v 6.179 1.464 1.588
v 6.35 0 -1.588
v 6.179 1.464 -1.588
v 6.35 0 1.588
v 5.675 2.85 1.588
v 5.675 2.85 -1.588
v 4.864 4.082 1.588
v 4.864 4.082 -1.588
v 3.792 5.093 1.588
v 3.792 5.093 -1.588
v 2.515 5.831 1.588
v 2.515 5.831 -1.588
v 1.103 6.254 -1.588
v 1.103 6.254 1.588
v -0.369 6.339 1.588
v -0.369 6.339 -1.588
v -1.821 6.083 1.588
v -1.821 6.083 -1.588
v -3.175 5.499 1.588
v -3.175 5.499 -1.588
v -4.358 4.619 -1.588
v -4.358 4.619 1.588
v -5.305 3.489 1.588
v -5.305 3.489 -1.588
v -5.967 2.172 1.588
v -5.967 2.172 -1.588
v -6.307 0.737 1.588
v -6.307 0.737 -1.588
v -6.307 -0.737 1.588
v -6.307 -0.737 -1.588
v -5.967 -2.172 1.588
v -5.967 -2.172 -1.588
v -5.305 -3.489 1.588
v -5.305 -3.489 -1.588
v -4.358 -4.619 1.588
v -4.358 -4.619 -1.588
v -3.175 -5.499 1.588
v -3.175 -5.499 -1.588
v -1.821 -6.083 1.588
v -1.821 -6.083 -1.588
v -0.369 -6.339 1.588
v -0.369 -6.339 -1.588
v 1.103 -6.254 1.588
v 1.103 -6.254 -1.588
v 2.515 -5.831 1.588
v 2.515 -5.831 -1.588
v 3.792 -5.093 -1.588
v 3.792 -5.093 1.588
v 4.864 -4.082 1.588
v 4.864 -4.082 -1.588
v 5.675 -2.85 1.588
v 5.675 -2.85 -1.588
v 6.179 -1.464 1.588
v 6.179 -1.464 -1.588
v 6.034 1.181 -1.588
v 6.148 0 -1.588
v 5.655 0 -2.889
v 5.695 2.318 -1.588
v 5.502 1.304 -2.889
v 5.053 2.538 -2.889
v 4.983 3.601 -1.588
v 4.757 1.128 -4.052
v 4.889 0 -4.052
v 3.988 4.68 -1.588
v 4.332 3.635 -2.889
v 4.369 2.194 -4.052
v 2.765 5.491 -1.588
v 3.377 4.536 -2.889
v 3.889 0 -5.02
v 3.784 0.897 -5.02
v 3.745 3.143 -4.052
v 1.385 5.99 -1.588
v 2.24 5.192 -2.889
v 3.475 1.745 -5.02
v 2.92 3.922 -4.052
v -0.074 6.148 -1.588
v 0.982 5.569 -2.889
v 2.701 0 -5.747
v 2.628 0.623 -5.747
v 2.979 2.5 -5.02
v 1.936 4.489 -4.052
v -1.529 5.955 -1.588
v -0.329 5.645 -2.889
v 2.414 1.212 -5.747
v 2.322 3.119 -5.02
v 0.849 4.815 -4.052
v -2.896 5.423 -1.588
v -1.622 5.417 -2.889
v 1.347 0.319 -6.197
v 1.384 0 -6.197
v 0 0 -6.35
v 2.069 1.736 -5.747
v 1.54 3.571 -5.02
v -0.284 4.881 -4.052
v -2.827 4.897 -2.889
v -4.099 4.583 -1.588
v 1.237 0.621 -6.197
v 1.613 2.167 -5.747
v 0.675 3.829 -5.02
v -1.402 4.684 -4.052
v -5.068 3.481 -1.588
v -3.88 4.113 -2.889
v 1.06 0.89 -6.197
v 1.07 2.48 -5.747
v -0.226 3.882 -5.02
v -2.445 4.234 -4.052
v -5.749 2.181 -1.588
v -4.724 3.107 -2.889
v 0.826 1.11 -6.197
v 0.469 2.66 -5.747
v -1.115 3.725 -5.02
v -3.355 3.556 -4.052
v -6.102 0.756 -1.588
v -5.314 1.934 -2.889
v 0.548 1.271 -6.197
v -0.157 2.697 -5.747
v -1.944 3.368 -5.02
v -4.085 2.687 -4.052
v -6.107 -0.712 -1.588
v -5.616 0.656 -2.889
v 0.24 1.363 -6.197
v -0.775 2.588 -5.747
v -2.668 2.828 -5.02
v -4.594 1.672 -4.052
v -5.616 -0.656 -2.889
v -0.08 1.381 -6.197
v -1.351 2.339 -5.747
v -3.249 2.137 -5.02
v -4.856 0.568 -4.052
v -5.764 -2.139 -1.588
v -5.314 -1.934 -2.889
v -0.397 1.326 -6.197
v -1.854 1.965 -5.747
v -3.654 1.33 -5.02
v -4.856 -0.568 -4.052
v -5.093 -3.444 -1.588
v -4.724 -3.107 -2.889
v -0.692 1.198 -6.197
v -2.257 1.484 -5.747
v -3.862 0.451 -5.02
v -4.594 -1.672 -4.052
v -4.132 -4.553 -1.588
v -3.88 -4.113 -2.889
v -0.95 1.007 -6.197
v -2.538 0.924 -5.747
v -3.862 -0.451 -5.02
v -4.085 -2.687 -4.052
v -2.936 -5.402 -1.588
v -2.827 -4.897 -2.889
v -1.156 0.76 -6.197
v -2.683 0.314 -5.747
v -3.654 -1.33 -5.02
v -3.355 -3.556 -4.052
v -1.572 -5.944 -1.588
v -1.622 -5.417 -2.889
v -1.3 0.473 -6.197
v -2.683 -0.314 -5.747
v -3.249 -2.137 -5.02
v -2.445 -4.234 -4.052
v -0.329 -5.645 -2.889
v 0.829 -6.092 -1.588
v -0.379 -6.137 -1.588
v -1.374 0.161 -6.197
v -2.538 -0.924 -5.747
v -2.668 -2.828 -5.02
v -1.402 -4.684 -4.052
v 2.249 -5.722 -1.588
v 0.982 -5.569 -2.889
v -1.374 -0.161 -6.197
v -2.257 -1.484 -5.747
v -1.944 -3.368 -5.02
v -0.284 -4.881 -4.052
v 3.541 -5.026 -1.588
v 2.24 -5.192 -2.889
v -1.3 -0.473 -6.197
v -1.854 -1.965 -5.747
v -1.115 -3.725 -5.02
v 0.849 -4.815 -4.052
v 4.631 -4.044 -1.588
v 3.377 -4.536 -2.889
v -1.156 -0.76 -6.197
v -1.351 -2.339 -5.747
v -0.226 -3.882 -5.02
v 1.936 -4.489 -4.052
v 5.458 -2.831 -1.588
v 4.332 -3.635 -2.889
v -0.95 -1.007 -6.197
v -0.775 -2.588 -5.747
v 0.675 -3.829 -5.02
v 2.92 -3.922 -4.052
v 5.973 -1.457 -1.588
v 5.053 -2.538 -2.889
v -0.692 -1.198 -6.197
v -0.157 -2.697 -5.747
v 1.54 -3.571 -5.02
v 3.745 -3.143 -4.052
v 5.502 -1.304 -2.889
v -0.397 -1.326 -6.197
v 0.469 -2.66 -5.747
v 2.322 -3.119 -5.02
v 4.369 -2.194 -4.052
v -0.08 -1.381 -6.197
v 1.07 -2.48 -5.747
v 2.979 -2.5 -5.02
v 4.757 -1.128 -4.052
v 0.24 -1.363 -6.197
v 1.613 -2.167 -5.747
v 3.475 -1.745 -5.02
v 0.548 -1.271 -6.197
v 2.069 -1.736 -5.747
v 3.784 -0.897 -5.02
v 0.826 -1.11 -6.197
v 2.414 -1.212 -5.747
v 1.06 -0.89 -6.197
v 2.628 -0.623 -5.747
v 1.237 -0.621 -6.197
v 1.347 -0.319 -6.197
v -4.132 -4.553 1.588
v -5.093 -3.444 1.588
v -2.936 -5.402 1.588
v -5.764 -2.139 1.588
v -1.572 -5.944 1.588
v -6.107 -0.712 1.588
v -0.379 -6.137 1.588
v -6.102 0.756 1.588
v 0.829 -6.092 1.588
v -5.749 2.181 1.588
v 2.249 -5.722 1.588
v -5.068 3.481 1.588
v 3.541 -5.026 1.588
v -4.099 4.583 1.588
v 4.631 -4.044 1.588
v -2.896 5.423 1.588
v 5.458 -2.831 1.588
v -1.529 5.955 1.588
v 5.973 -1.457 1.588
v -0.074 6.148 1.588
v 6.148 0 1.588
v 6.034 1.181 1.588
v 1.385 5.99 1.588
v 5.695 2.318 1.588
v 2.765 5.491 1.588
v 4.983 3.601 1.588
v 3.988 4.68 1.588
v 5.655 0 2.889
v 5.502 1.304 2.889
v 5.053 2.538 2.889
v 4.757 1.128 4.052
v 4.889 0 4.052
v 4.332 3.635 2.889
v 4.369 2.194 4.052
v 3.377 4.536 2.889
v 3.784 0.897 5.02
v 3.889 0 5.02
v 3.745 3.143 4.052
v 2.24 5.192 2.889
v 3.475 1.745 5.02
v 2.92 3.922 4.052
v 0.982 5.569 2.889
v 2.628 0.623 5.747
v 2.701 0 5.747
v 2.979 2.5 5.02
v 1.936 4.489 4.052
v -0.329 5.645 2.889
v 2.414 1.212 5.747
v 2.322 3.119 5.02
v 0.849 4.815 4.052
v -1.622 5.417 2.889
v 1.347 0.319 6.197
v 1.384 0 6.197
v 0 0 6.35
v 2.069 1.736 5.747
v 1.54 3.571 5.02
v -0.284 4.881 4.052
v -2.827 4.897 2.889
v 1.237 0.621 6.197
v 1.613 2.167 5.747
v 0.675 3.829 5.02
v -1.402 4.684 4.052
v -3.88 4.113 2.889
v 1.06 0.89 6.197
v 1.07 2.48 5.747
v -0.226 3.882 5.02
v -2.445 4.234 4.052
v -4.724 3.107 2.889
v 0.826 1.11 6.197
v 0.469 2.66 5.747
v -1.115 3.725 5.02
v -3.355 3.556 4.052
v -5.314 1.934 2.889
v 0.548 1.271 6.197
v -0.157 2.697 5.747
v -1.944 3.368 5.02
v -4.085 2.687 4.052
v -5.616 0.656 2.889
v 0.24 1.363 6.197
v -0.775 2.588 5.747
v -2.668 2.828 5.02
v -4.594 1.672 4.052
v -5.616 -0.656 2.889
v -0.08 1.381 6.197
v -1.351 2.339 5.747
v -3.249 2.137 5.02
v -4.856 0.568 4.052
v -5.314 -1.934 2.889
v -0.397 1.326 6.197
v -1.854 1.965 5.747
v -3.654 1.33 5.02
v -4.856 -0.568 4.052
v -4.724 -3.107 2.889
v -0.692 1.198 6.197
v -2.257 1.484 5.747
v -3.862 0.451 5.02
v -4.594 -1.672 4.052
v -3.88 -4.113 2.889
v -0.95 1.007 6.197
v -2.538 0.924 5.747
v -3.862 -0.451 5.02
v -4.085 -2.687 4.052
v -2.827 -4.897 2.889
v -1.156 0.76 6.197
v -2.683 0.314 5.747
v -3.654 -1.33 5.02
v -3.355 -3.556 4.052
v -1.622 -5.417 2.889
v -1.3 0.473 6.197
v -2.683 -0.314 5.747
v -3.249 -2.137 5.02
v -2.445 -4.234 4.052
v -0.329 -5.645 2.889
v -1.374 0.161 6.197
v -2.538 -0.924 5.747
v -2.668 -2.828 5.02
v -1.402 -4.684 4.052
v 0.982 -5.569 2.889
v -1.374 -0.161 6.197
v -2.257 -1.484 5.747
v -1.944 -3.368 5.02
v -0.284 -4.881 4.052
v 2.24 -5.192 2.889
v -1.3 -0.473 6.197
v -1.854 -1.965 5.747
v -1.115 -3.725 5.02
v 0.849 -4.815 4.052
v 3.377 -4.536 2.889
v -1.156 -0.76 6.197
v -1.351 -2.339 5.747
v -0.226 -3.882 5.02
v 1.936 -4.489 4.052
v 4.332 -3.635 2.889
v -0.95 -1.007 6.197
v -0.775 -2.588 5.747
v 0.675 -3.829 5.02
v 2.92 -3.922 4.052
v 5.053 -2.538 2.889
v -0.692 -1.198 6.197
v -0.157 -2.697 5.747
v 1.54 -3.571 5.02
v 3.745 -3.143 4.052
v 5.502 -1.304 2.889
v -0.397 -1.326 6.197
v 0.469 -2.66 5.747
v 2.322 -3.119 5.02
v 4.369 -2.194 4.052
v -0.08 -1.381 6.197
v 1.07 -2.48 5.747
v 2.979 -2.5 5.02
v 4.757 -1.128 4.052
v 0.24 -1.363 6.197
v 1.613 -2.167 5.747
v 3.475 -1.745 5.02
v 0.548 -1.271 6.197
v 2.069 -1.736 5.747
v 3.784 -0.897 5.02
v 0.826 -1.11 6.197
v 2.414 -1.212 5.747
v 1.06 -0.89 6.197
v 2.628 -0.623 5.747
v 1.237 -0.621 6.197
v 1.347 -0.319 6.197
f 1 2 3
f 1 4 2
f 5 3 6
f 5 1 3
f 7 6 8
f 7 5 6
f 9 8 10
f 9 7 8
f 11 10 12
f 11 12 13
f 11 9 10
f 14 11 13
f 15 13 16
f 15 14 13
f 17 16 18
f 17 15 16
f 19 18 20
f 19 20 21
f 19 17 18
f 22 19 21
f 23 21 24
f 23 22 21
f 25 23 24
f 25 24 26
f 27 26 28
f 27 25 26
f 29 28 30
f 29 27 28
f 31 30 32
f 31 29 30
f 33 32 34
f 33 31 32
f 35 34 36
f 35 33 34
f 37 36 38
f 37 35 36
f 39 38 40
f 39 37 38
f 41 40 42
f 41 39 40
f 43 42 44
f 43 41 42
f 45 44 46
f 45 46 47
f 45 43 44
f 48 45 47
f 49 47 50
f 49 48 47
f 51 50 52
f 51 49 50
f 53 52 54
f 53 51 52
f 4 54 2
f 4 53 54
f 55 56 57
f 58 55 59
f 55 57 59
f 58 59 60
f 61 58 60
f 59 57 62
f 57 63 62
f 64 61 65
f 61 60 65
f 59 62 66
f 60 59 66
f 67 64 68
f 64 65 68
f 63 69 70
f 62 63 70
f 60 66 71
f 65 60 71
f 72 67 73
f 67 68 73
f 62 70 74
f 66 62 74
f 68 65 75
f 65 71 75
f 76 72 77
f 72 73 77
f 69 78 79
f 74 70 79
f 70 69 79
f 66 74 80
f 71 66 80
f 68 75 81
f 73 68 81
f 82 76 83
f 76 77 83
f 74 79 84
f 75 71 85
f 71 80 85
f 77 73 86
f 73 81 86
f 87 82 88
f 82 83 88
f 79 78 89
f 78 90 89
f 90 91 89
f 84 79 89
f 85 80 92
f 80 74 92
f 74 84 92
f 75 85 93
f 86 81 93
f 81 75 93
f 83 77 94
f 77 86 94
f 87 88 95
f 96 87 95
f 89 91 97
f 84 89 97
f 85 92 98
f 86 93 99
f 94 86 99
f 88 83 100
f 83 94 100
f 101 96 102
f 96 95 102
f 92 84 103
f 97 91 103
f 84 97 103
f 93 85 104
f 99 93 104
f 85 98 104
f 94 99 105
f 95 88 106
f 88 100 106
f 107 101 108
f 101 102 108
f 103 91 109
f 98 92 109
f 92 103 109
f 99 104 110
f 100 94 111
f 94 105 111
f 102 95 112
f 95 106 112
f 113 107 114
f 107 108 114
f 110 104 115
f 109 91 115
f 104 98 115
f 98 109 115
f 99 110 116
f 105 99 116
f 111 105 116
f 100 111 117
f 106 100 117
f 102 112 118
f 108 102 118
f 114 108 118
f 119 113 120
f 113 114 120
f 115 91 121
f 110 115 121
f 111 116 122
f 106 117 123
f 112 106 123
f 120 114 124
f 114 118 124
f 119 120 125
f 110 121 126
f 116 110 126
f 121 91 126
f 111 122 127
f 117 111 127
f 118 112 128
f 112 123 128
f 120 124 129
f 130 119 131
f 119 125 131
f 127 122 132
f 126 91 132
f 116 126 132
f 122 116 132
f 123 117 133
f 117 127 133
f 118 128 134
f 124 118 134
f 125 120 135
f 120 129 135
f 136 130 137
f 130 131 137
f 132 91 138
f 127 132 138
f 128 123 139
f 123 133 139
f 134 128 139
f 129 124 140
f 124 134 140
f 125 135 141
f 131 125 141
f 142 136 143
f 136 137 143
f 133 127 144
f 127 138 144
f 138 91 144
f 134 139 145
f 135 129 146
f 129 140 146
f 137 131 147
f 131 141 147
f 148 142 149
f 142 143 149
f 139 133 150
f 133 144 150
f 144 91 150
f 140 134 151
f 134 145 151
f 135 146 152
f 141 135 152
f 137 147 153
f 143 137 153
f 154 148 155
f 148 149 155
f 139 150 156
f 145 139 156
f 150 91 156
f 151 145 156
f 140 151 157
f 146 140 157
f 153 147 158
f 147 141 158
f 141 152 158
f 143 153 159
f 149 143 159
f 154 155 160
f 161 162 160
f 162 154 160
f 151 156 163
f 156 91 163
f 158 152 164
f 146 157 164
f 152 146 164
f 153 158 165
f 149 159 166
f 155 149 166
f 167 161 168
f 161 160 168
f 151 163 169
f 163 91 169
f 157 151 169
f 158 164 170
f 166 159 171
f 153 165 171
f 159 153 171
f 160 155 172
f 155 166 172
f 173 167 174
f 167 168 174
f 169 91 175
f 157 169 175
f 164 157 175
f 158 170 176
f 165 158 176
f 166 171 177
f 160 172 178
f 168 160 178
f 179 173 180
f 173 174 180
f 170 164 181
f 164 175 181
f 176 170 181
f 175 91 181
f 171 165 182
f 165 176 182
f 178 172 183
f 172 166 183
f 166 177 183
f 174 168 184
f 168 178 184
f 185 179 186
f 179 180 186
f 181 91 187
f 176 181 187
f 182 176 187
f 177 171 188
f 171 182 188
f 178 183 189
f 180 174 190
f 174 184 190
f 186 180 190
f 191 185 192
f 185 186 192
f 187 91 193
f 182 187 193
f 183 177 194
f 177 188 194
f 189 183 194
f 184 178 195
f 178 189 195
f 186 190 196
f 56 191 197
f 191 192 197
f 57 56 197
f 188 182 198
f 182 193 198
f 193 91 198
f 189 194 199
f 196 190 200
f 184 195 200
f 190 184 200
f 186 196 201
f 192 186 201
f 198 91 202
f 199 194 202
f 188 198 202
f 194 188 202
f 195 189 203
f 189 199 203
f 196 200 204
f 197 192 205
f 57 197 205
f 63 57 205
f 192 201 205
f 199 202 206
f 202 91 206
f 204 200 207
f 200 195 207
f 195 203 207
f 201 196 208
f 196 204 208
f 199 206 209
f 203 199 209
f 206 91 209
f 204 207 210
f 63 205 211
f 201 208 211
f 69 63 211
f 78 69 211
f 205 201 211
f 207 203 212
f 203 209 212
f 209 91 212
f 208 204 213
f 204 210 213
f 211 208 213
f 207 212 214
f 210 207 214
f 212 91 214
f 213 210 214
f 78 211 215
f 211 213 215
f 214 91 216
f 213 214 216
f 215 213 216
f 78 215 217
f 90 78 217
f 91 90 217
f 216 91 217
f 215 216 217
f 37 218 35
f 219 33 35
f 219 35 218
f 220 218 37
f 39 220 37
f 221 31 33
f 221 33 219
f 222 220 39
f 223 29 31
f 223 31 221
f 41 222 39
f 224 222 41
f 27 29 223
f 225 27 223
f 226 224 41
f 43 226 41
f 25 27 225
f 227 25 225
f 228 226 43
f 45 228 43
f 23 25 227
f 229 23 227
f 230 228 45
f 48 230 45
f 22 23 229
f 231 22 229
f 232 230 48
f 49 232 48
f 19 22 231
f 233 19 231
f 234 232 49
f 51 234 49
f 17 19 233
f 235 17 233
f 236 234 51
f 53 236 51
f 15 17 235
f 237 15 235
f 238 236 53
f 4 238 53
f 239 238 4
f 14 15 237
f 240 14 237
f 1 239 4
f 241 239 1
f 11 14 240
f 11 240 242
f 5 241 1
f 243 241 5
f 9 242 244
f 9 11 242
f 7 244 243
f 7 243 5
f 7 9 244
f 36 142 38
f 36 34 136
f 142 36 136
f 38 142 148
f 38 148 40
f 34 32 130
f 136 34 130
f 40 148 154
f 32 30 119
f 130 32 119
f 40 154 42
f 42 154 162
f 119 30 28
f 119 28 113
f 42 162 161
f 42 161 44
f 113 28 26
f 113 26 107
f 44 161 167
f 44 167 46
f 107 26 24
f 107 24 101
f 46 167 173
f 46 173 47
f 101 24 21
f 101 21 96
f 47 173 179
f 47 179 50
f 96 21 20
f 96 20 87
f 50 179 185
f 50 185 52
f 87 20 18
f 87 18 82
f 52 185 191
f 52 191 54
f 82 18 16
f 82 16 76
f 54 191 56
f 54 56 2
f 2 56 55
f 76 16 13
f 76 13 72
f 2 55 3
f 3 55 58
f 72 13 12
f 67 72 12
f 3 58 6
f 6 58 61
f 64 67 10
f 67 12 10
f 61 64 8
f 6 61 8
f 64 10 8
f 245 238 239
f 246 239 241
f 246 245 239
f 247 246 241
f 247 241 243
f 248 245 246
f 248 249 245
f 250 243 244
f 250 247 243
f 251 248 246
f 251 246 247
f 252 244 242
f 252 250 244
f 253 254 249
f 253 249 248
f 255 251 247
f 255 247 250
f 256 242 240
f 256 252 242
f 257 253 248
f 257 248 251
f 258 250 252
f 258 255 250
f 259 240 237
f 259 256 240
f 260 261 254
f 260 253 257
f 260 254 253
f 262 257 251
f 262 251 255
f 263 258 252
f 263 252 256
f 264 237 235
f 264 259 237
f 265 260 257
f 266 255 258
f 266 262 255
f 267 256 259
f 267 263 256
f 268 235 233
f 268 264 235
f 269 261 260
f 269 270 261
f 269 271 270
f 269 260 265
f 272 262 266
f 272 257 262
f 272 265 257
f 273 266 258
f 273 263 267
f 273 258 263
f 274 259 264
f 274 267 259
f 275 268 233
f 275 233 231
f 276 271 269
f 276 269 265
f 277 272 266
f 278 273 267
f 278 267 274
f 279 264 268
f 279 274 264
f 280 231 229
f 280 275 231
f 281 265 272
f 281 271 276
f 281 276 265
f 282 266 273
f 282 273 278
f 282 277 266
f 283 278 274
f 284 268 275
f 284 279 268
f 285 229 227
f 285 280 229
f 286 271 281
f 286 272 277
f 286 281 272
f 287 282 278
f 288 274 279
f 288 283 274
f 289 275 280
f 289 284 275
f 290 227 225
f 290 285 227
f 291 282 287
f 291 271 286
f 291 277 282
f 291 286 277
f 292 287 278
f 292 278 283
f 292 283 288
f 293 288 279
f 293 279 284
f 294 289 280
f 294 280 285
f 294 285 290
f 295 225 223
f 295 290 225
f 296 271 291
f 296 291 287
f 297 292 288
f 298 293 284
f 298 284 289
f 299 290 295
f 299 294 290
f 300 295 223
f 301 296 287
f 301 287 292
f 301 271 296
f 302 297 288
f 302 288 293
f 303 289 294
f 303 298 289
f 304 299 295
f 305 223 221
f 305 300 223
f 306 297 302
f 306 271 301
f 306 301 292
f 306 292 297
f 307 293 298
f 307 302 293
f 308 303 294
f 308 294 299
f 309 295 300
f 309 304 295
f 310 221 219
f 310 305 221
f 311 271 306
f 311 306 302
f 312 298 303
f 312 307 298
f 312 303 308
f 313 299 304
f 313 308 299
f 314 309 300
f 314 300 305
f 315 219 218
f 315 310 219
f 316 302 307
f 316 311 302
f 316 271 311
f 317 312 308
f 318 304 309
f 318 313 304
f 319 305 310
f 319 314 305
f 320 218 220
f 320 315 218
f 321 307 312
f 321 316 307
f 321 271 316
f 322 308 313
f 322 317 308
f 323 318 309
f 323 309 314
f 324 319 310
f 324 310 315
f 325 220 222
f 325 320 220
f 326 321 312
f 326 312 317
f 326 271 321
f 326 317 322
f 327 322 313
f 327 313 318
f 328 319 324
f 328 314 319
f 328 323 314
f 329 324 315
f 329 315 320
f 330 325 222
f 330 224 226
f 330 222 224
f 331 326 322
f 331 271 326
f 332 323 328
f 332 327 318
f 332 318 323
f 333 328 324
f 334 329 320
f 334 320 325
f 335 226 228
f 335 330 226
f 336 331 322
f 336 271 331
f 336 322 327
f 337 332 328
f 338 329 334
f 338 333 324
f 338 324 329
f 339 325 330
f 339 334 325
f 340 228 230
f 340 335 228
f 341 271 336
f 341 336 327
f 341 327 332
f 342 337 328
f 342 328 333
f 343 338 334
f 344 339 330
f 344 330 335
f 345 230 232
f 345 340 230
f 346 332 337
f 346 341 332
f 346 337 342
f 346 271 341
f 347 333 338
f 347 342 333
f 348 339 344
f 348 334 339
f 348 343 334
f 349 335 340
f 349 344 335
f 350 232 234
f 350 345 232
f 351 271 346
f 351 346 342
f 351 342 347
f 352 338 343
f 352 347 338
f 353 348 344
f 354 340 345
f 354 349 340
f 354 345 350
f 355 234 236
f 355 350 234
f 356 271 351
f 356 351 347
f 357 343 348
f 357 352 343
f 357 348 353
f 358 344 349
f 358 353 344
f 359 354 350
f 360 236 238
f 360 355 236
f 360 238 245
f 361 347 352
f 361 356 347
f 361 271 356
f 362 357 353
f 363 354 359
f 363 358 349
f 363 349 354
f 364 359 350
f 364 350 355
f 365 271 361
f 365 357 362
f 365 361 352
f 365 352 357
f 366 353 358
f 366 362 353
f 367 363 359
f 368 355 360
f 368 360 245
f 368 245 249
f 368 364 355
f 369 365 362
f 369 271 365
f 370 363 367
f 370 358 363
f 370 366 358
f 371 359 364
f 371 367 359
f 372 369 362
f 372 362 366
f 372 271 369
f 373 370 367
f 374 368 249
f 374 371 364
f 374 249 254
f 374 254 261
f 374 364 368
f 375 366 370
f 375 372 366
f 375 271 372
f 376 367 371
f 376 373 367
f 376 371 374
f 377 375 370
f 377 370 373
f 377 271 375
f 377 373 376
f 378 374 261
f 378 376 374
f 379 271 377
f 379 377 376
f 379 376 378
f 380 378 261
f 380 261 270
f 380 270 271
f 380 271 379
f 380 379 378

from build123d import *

# Parameters (mm, degrees)
F0_R     = 6.35
F1_DEPTH = 6.35
F2_R     = 6.34999
F3_R     = 6.35
F4_DEPTH = 1.5875


# Not quite as in the source:
# - a fillet or chamfer is up to 0.001 mm smaller than in the source, because OpenCascade refuses the exact size


with BuildPart() as f1:
    # F0 (on Top) → F1 (new body, symmetric)
    with BuildSketch(Plane.XY):
        Circle(F0_R)
    extrude(amount=F1_DEPTH, both=True)

    # F2 (radius 6.35 in the source; OpenCascade refuses exactly that, so slightly less here)
    f2_edges = [f1.edges().sort_by_distance(p)[0] for p in [
        (-6.35, 0, 6.35),
        (-6.35, 0, -6.35),
    ]]
    fillet(f2_edges, radius=F2_R)

    # F3 (on Top) → F4 (join, symmetric)
    with BuildSketch(Plane.XY):
        Circle(F3_R)
    extrude(amount=F4_DEPTH, both=True)


solid = f1.part
